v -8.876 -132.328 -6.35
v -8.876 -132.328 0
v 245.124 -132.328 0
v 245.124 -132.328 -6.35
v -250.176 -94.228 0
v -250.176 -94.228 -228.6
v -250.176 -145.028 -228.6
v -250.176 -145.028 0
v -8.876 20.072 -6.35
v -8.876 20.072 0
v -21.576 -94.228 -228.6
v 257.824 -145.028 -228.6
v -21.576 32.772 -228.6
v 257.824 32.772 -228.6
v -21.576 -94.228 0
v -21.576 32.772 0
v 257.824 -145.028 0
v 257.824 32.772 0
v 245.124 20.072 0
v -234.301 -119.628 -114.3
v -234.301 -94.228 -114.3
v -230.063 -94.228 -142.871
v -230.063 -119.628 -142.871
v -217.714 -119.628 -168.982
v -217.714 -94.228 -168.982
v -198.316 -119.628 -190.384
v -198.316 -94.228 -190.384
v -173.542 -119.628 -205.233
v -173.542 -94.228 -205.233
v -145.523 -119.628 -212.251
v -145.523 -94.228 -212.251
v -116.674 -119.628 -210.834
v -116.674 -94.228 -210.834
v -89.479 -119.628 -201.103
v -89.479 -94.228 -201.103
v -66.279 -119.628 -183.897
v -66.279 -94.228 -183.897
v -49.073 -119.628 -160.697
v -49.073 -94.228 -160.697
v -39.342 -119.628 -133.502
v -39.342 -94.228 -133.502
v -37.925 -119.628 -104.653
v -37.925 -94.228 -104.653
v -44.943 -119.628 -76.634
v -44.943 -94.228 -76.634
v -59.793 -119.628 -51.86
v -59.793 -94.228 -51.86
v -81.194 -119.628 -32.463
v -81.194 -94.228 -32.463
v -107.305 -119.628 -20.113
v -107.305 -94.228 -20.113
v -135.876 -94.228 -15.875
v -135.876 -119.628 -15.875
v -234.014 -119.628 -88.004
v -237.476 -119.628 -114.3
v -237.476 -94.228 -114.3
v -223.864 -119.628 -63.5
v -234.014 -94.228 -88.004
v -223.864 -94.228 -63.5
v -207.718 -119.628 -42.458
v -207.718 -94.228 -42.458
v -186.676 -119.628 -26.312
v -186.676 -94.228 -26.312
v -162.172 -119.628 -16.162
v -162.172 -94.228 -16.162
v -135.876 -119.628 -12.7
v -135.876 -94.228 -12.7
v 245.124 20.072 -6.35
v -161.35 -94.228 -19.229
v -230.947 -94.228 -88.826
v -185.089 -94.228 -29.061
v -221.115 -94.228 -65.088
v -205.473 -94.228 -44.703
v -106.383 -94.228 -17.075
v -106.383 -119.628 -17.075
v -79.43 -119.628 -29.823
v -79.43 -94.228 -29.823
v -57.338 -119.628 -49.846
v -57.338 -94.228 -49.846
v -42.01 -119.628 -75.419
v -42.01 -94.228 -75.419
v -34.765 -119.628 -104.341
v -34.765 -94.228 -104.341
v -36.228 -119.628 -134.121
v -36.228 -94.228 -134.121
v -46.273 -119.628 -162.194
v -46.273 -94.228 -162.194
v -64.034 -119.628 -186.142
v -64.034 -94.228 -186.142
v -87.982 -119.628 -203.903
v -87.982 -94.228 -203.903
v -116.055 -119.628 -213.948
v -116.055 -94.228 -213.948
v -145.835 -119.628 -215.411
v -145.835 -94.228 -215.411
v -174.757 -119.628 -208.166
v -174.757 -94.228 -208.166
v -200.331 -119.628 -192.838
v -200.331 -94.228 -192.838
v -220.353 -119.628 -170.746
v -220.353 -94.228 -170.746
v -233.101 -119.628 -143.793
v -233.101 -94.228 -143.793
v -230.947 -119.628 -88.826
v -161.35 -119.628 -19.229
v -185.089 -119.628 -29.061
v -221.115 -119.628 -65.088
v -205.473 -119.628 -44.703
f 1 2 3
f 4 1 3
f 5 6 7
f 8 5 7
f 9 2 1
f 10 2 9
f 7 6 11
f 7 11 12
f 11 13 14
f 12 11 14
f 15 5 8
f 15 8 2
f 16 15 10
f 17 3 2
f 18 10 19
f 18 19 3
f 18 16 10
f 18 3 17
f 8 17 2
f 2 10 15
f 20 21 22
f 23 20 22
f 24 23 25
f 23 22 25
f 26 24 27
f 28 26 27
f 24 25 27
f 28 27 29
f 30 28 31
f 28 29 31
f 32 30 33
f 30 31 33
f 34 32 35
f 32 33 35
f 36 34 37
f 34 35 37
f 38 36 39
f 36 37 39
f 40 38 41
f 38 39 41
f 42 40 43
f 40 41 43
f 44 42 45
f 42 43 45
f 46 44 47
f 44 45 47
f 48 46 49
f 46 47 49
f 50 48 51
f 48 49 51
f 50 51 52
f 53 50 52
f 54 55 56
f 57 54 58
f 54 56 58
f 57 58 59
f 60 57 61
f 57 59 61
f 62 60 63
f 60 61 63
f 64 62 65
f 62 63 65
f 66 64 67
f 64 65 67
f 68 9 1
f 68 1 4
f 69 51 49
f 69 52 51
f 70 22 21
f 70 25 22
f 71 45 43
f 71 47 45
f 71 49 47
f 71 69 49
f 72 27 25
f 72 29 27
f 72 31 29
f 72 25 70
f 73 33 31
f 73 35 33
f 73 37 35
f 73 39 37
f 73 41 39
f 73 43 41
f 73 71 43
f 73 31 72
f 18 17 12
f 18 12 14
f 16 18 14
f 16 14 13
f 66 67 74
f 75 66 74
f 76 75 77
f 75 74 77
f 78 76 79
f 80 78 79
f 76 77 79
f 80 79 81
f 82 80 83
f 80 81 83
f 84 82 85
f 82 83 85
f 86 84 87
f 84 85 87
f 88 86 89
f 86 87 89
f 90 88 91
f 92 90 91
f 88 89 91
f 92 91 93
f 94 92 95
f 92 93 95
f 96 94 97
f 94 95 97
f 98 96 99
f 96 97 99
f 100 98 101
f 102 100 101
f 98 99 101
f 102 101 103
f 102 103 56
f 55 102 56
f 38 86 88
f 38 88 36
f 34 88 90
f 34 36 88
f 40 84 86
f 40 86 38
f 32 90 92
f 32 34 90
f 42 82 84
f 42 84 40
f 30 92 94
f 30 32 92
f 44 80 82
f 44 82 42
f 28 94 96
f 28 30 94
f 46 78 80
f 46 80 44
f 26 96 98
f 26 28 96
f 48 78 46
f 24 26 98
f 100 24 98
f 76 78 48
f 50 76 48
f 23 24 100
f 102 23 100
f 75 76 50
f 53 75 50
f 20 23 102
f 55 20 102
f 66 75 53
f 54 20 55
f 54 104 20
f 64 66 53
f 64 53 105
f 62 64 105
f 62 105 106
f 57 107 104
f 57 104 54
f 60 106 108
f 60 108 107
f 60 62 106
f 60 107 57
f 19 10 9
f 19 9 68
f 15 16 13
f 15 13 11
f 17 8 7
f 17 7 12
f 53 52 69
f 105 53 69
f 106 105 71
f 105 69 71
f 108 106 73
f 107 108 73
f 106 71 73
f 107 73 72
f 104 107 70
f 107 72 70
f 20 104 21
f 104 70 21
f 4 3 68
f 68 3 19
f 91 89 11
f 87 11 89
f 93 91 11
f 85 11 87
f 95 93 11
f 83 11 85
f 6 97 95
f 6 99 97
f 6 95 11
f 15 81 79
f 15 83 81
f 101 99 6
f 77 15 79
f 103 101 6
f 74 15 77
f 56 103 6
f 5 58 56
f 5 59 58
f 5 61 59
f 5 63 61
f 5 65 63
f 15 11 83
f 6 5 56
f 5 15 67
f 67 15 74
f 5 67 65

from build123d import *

# Parameters (mm, degrees)
F0_W     = 254
F0_H     = 152.4
F1_DEPTH = 228.6
F2_DEPTH = 6.35
F4_DEPTH = 25.4


with BuildPart() as f1:
    # F0 (on Top) → F1 (new body)
    with BuildSketch(Plane.XY):
        Polygon((257.823838, 32.772094), (-21.576162, 32.772094), (-21.576162, -94.227906), (-250.176162, -94.227906), (-250.176162, -145.027906), (257.823838, -145.027906), align=None)
        with Locations((118.123838, -56.127906)):
            Rectangle(F0_W, F0_H, mode=Mode.SUBTRACT)
        with Locations((118.123838, -56.127906)):
            Rectangle(F0_W, F0_H)
    extrude(amount=-F1_DEPTH)

    # F0 (on Top) → F2 (cut)
    with BuildSketch(Plane.XY):
        with Locations((118.123838, -56.127906)):
            Rectangle(F0_W, F0_H)
    extrude(amount=-F2_DEPTH, mode=Mode.SUBTRACT)

    # F3 (on face) → F4 (cut)
    with BuildSketch(Plane(origin=(0, -94.227906, 0), x_dir=(-1, 0, 0), z_dir=(0, 1, 0))):
        with BuildLine():
            ThreePointArc((237.476162, -114.3), (207.71821, -42.457951), (135.876162, -12.7))
            ThreePointArc((135.876162, -12.7), (64.034113, -186.142049), (237.476162, -114.3))
        make_face()
        with BuildLine():
            ThreePointArc((234.301162, -114.3), (66.279177, -183.896985), (135.876162, -15.875))
            ThreePointArc((135.876162, -15.875), (205.473146, -44.703015), (234.301162, -114.3))
        make_face(mode=Mode.SUBTRACT)
    extrude(amount=-F4_DEPTH, mode=Mode.SUBTRACT)


solid = f1.part
